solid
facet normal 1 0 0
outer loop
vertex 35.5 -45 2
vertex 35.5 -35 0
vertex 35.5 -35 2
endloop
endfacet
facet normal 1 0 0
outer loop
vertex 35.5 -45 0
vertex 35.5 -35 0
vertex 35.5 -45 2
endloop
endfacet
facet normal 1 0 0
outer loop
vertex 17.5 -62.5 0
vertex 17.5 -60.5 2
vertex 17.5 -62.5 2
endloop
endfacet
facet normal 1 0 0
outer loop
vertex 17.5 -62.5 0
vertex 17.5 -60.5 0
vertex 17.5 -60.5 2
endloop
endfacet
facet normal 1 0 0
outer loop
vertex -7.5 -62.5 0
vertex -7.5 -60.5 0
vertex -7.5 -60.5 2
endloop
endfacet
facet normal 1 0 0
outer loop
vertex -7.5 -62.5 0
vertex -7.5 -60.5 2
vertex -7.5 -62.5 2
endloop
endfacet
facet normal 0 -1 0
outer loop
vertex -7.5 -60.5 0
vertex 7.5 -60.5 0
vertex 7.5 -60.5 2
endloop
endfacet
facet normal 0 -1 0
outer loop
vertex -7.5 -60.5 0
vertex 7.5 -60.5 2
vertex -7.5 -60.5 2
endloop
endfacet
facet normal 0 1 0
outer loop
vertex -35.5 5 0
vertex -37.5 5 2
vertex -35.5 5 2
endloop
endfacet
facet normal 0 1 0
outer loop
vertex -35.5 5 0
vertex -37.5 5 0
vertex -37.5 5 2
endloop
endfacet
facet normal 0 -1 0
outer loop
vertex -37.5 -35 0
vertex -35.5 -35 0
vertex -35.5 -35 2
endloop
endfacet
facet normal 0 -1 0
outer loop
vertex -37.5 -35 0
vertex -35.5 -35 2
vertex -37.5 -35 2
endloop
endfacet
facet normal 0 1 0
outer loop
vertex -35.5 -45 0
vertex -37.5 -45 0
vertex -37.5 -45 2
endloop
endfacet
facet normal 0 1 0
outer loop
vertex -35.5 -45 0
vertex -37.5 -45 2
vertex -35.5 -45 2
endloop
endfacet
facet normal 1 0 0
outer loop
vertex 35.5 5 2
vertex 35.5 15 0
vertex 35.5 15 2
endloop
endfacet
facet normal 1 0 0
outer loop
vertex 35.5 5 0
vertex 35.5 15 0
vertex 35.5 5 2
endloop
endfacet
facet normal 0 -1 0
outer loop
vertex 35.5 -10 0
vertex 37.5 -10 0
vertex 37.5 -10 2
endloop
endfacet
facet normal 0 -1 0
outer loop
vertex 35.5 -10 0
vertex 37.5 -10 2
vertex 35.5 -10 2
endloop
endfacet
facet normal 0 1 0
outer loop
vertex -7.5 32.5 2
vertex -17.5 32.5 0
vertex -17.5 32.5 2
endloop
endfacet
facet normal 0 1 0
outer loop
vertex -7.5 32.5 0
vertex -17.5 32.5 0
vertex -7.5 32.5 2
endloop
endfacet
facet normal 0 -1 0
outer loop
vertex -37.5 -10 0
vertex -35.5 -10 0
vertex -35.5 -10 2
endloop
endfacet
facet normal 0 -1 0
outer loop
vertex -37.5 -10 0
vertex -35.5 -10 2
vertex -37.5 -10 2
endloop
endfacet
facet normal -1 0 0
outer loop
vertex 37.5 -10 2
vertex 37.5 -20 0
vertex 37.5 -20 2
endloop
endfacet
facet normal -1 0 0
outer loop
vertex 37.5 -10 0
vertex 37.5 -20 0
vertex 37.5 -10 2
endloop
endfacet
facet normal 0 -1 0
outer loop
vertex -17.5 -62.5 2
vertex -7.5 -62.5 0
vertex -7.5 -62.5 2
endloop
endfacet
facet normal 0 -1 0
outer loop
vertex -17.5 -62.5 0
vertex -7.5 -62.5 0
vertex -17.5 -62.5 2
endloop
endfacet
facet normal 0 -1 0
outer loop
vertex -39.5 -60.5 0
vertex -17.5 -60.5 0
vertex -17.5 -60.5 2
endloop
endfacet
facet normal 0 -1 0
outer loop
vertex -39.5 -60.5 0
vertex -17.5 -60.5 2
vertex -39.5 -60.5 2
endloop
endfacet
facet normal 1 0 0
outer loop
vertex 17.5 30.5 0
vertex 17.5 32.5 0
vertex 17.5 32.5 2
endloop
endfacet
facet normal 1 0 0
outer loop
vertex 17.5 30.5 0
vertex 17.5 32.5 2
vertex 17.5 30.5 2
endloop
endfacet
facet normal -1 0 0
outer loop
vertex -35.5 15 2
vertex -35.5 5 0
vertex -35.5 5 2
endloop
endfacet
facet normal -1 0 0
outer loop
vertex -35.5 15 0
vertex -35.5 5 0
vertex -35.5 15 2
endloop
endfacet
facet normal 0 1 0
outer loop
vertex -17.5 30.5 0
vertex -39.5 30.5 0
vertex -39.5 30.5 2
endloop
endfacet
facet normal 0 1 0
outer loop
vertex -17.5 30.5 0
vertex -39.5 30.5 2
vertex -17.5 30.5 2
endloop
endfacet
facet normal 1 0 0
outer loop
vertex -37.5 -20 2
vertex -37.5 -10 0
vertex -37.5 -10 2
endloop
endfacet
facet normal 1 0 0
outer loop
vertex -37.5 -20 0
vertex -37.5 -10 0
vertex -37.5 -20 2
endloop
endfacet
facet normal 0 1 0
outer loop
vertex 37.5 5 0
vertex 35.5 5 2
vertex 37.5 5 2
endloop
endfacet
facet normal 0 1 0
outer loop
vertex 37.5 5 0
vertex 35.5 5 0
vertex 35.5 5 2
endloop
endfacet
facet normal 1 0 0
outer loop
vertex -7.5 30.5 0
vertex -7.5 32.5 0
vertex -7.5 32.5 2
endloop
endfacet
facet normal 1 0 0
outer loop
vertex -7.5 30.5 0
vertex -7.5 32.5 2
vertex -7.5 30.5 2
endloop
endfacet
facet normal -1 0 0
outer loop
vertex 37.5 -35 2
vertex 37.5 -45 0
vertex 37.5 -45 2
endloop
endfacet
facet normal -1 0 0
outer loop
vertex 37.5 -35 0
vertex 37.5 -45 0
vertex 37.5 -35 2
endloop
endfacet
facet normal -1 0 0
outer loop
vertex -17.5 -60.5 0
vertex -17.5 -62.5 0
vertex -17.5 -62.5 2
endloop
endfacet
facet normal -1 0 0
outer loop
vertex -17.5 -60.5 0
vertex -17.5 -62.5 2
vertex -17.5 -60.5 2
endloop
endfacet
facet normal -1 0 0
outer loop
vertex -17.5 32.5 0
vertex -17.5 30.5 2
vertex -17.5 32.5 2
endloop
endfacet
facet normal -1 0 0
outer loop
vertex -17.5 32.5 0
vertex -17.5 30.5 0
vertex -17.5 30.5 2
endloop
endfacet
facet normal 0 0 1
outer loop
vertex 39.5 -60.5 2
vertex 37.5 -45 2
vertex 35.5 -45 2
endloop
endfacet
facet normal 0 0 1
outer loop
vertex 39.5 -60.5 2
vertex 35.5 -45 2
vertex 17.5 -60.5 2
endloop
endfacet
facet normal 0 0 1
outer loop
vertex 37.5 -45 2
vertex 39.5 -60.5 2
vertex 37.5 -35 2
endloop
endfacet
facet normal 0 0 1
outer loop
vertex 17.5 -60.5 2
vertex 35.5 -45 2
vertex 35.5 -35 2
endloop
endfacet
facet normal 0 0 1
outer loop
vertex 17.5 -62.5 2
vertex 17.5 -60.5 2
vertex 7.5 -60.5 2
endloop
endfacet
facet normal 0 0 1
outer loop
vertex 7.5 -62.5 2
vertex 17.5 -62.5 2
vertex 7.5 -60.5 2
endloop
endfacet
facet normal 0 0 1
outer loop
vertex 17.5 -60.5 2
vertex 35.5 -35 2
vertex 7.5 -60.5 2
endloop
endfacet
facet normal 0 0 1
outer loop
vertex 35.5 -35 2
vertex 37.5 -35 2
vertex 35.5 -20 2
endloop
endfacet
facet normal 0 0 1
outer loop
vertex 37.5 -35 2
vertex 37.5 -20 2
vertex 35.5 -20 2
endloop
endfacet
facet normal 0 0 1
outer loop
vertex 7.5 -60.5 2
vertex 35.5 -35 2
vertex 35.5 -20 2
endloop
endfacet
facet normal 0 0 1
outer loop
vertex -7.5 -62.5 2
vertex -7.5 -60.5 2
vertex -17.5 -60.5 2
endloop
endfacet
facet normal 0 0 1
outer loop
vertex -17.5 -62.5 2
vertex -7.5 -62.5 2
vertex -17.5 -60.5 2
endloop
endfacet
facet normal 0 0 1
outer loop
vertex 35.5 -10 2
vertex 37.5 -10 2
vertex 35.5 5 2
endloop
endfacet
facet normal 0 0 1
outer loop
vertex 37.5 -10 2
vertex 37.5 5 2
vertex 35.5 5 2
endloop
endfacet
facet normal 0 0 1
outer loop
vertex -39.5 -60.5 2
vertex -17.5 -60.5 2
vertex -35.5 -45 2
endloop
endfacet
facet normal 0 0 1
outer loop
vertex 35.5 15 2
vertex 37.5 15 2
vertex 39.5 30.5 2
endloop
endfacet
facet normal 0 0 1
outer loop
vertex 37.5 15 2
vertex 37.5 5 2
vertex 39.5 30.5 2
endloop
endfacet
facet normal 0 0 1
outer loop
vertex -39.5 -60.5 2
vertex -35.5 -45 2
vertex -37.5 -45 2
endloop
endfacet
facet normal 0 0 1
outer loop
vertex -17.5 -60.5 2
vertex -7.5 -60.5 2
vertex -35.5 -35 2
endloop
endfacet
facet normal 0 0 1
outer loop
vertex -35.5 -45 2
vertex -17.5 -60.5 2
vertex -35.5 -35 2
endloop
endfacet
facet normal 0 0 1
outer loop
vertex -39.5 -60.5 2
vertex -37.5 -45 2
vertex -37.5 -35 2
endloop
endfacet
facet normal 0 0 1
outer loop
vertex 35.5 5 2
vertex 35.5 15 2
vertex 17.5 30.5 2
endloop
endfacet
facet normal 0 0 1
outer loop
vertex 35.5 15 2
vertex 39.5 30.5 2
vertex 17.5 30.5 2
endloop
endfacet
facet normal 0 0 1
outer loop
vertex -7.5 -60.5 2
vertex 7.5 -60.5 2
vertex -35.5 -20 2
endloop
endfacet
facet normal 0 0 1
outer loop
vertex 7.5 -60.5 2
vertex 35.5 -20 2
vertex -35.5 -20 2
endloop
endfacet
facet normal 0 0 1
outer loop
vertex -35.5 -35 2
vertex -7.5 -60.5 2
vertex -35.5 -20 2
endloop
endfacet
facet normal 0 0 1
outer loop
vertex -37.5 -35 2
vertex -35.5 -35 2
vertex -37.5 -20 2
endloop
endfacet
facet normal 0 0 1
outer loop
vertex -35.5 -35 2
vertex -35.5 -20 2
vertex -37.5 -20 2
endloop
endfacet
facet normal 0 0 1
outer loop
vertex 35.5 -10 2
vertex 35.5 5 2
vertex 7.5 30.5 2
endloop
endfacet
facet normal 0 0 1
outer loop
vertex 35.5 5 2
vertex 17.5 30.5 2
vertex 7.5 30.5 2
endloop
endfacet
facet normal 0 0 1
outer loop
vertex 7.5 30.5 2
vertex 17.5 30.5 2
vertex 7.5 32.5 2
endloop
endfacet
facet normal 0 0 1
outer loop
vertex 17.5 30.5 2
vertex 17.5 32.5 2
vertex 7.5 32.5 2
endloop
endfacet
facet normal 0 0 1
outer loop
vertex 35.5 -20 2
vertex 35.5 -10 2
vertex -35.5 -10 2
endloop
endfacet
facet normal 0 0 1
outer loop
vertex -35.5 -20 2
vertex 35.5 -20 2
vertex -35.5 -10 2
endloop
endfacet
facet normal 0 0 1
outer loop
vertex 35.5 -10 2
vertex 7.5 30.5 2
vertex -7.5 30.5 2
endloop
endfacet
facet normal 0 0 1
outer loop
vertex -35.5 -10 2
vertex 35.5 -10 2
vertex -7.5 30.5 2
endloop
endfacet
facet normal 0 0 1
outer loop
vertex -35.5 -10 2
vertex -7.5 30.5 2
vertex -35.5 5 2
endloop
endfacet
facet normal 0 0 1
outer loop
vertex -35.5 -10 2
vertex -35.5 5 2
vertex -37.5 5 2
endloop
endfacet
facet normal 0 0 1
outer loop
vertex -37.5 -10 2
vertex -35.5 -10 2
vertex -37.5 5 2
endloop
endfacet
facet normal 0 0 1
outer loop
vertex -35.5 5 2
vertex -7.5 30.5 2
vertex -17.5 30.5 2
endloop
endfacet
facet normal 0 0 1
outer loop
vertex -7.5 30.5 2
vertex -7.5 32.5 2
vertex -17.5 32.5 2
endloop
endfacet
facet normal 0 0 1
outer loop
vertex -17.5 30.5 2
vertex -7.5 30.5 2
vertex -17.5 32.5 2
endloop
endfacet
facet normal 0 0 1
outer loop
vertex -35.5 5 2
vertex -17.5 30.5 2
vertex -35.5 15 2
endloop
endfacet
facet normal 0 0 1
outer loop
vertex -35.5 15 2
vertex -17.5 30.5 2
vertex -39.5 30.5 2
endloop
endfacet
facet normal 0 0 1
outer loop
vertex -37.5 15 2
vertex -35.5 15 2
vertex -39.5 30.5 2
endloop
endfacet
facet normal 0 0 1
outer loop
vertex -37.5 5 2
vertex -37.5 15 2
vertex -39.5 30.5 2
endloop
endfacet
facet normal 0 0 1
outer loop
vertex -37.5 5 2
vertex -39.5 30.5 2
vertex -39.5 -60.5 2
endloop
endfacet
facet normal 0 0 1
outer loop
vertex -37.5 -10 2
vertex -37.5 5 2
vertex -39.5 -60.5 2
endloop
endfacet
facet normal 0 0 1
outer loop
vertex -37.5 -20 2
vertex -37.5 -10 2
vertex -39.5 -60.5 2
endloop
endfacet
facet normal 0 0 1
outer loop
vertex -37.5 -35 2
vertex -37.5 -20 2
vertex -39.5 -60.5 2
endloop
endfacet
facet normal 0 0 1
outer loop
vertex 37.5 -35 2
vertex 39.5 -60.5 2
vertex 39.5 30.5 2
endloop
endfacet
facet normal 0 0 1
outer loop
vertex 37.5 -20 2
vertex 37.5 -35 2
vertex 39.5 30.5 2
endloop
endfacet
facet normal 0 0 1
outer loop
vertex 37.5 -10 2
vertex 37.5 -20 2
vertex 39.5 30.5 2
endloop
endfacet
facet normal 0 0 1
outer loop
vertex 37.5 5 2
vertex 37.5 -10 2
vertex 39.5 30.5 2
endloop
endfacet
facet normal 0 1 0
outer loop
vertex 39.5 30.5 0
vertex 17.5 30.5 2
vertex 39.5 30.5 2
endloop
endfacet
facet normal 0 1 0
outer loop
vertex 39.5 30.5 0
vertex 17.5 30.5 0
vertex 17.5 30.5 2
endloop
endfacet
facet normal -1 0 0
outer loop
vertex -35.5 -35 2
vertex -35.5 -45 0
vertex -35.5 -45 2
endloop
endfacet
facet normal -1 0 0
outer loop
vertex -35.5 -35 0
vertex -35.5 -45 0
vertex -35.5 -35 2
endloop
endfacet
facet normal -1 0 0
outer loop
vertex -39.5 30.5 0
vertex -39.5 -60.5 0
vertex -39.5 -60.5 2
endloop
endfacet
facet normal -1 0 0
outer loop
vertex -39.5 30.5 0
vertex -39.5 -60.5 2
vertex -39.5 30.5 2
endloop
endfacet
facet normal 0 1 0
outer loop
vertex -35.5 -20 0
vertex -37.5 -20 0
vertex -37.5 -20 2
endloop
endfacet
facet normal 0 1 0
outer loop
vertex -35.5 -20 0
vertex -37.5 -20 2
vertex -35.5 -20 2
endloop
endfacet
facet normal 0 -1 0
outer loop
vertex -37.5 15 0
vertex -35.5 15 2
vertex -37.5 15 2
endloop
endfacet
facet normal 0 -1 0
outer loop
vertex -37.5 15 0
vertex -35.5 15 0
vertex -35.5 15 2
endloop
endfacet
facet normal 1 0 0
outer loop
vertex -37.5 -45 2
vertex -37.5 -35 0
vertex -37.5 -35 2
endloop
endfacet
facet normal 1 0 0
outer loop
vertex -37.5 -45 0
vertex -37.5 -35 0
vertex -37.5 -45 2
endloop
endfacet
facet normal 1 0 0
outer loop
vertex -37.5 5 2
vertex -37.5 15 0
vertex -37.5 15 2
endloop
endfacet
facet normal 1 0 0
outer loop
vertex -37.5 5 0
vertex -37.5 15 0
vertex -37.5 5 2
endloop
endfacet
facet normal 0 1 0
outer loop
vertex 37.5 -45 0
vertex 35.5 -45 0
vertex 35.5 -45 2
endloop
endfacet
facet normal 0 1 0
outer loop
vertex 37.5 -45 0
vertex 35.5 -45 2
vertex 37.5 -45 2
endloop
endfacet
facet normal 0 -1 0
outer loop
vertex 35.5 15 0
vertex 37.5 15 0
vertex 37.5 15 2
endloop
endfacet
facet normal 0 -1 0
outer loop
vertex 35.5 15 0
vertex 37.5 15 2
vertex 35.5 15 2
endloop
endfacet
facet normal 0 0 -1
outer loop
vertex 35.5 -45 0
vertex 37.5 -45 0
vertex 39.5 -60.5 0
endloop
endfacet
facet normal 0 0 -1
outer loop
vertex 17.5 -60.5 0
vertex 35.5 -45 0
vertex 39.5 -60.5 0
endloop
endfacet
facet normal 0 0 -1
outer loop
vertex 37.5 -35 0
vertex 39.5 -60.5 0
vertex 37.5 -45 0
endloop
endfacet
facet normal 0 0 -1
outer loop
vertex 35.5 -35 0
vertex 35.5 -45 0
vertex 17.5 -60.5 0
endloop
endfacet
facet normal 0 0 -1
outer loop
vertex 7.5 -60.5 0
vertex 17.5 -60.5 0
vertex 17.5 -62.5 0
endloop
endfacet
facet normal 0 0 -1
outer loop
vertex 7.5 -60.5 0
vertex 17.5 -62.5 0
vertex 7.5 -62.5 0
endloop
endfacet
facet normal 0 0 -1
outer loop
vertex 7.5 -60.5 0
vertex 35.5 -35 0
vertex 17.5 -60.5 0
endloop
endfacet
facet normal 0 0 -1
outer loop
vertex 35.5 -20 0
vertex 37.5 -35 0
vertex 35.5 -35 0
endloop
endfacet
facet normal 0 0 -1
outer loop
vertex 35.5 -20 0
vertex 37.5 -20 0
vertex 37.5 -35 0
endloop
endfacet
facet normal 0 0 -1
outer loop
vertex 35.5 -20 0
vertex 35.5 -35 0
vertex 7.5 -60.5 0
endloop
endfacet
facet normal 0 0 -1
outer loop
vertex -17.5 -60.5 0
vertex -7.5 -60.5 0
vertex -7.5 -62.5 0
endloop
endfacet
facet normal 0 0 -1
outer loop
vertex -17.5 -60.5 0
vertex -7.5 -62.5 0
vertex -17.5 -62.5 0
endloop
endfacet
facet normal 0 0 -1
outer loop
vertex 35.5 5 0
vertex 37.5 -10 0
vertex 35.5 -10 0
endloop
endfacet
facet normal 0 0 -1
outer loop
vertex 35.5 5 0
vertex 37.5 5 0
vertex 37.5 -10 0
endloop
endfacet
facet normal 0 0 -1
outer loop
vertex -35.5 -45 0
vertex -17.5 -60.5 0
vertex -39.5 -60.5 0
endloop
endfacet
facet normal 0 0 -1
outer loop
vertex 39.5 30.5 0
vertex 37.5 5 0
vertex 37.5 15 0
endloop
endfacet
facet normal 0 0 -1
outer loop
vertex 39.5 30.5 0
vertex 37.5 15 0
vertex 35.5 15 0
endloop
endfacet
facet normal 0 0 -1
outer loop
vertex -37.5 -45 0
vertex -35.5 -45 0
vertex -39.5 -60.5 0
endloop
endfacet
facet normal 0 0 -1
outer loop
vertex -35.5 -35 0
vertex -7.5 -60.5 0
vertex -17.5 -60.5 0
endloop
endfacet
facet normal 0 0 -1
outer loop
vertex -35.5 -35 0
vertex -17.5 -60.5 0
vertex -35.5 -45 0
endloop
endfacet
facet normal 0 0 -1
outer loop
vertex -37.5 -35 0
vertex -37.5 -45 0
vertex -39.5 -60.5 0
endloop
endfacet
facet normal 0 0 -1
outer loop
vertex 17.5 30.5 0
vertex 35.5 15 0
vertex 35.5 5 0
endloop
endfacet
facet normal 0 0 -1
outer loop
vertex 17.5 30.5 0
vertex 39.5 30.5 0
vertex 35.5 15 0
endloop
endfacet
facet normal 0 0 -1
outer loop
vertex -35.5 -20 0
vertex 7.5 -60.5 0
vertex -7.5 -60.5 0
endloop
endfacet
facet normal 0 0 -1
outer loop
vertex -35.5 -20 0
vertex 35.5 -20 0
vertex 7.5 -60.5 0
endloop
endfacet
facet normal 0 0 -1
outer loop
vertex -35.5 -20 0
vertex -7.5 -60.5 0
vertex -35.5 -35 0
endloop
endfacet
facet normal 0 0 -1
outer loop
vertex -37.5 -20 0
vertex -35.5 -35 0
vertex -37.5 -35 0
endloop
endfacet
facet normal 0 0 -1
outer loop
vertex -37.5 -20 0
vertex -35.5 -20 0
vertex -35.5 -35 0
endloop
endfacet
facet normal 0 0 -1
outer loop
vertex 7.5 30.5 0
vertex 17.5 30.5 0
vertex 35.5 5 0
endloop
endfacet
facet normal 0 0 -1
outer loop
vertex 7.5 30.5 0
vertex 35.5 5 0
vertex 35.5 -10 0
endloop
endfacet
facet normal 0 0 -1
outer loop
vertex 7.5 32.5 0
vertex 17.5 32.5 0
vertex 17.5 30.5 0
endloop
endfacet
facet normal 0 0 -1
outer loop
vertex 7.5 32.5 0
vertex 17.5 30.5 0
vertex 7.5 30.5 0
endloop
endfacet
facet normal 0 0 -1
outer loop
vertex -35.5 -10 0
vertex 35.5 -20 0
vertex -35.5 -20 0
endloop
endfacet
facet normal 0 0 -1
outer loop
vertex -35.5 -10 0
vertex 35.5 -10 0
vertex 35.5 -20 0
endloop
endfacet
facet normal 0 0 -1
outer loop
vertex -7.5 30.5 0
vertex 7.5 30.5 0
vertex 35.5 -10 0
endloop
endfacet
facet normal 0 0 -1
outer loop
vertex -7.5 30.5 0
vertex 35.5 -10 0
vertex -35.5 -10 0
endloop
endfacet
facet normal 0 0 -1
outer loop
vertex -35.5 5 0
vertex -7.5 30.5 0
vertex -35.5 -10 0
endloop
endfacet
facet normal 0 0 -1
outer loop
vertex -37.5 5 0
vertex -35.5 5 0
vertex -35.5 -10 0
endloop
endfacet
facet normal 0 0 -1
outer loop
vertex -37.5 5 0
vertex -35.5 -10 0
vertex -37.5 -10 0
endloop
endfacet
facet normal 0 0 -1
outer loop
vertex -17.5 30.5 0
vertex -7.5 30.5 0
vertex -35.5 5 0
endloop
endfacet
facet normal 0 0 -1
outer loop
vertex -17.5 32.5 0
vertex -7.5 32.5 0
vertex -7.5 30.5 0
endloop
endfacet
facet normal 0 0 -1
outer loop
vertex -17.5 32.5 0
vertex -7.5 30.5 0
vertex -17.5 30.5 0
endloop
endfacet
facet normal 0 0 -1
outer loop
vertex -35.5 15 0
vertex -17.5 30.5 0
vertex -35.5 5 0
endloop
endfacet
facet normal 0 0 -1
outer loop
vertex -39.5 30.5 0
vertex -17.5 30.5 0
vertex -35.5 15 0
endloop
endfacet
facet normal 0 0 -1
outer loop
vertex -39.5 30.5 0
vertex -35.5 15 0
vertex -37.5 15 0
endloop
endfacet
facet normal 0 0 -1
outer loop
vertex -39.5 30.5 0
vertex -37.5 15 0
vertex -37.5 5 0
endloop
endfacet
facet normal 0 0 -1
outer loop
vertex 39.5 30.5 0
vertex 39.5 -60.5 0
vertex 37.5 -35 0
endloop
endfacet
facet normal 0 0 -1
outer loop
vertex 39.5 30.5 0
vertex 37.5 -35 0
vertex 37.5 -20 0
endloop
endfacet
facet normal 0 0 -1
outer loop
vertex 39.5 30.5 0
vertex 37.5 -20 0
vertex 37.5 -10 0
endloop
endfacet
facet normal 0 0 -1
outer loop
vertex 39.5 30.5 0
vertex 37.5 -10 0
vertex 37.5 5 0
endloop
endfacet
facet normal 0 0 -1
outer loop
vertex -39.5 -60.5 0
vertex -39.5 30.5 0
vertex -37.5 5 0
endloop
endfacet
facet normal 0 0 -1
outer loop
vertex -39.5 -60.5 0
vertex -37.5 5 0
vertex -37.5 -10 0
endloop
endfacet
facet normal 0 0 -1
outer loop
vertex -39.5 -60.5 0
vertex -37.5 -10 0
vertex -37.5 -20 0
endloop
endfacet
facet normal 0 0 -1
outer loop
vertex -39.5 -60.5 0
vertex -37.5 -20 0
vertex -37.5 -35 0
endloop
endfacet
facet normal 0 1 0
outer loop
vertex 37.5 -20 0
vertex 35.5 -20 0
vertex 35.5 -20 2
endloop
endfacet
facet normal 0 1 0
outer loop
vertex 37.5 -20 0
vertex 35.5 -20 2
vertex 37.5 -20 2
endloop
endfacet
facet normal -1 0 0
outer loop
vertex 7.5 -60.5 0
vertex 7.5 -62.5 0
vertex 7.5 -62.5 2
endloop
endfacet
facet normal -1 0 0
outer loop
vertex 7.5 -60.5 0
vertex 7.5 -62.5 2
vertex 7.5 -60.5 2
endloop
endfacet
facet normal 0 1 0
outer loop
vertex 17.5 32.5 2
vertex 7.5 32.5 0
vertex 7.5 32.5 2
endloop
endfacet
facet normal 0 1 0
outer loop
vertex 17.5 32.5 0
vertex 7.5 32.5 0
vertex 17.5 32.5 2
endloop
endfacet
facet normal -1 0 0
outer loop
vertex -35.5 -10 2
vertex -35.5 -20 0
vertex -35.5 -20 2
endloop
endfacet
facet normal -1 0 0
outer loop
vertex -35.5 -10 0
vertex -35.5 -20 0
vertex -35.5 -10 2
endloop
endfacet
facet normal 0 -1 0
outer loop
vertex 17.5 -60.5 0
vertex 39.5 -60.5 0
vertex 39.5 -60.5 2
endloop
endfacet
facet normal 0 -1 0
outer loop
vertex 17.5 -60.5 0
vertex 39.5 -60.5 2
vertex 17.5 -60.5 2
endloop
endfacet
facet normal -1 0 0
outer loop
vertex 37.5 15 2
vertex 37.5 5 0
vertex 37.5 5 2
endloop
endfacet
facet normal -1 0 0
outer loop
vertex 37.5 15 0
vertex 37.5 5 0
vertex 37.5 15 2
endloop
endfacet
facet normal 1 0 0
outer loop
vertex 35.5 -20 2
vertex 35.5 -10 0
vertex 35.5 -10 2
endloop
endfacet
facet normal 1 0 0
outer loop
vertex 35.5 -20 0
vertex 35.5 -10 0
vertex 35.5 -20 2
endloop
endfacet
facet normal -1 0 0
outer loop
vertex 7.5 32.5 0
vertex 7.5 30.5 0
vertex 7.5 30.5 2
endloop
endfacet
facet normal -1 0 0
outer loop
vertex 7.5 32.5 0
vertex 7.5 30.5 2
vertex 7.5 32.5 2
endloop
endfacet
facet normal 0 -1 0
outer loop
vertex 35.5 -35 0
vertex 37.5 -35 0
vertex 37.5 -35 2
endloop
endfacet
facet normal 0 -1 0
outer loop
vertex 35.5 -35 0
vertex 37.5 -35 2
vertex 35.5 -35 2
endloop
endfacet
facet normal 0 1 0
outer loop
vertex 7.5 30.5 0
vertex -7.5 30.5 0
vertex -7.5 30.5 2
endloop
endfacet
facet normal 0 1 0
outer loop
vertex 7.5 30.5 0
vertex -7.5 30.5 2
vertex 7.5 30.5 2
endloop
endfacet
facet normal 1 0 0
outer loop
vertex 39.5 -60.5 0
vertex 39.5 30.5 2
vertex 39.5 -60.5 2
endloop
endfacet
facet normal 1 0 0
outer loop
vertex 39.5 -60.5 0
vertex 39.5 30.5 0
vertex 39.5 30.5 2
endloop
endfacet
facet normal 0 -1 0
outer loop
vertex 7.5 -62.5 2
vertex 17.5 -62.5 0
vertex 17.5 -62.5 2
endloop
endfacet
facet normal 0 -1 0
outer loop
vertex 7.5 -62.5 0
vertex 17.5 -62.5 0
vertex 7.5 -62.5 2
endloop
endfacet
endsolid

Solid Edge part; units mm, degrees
sketch "Sketch1" plane through (0, 0, 0) normal (0, 0, 1) x (1, 0, 0)
  line L0 (7.5, -60.5) -> (-7.5, -60.5)
  line L1 (-7.5, -60.5) -> (-7.5, -62.5)
  line L2 (-7.5, -62.5) -> (-17.5, -62.5)
  line L3 (-17.5, -62.5) -> (-17.5, -60.5)
  line L4 (-17.5, -60.5) -> (-39.5, -60.5)
  line L5 (-39.5, -60.5) -> (-39.5, 30.5)
  line L6 (-39.5, 30.5) -> (-17.5, 30.5)
  line L7 (-17.5, 30.5) -> (-17.5, 32.5)
  line L8 (-17.5, 32.5) -> (-7.5, 32.5)
  line L9 (-7.5, 32.5) -> (-7.5, 30.5)
  line L10 (-7.5, 30.5) -> (7.5, 30.5)
  line L11 (7.5, 30.5) -> (7.5, 32.5)
  line L12 (7.5, 32.5) -> (17.5, 32.5)
  line L13 (17.5, 32.5) -> (17.5, 30.5)
  line L14 (17.5, 30.5) -> (39.5, 30.5)
  line L15 (39.5, 30.5) -> (39.5, -60.5)
  line L16 (39.5, -60.5) -> (17.5, -60.5)
  line L17 (17.5, -60.5) -> (17.5, -62.5)
  line L18 (17.5, -62.5) -> (7.5, -62.5)
  line L19 (7.5, -62.5) -> (7.5, -60.5)
  line L20 (37.5, 5) -> (37.5, 15)
  line L21 (35.5, 5) -> (37.5, 5)
  line L22 (35.5, 15) -> (35.5, 5)
  line L23 (37.5, 15) -> (35.5, 15)
  line L24 (-35.5, -45) -> (-35.5, -35)
  line L25 (-37.5, -45) -> (-35.5, -45)
  line L26 (-37.5, -35) -> (-37.5, -45)
  line L27 (-35.5, -35) -> (-37.5, -35)
  line L28 (-37.5, 15) -> (-37.5, 5)
  line L29 (-35.5, 15) -> (-37.5, 15)
  line L30 (-35.5, 5) -> (-35.5, 15)
  line L31 (-37.5, 5) -> (-35.5, 5)
  line L32 (35.5, -45) -> (37.5, -45)
  line L33 (35.5, -35) -> (35.5, -45)
  line L34 (37.5, -35) -> (35.5, -35)
  line L35 (37.5, -45) -> (37.5, -35)
  line L36 (37.5, -20) -> (37.5, -10)
  line L37 (35.5, -20) -> (37.5, -20)
  line L38 (35.5, -10) -> (35.5, -20)
  line L39 (37.5, -10) -> (35.5, -10)
  line L40 (-37.5, -20) -> (-35.5, -20)
  line L41 (-37.5, -10) -> (-37.5, -20)
  line L42 (-35.5, -10) -> (-37.5, -10)
  line L43 (-35.5, -20) -> (-35.5, -10)
extrude "Protrusion1" add sketch "Sketch1" along normal blind 2
properties material "Acrylic, high impact grade"
